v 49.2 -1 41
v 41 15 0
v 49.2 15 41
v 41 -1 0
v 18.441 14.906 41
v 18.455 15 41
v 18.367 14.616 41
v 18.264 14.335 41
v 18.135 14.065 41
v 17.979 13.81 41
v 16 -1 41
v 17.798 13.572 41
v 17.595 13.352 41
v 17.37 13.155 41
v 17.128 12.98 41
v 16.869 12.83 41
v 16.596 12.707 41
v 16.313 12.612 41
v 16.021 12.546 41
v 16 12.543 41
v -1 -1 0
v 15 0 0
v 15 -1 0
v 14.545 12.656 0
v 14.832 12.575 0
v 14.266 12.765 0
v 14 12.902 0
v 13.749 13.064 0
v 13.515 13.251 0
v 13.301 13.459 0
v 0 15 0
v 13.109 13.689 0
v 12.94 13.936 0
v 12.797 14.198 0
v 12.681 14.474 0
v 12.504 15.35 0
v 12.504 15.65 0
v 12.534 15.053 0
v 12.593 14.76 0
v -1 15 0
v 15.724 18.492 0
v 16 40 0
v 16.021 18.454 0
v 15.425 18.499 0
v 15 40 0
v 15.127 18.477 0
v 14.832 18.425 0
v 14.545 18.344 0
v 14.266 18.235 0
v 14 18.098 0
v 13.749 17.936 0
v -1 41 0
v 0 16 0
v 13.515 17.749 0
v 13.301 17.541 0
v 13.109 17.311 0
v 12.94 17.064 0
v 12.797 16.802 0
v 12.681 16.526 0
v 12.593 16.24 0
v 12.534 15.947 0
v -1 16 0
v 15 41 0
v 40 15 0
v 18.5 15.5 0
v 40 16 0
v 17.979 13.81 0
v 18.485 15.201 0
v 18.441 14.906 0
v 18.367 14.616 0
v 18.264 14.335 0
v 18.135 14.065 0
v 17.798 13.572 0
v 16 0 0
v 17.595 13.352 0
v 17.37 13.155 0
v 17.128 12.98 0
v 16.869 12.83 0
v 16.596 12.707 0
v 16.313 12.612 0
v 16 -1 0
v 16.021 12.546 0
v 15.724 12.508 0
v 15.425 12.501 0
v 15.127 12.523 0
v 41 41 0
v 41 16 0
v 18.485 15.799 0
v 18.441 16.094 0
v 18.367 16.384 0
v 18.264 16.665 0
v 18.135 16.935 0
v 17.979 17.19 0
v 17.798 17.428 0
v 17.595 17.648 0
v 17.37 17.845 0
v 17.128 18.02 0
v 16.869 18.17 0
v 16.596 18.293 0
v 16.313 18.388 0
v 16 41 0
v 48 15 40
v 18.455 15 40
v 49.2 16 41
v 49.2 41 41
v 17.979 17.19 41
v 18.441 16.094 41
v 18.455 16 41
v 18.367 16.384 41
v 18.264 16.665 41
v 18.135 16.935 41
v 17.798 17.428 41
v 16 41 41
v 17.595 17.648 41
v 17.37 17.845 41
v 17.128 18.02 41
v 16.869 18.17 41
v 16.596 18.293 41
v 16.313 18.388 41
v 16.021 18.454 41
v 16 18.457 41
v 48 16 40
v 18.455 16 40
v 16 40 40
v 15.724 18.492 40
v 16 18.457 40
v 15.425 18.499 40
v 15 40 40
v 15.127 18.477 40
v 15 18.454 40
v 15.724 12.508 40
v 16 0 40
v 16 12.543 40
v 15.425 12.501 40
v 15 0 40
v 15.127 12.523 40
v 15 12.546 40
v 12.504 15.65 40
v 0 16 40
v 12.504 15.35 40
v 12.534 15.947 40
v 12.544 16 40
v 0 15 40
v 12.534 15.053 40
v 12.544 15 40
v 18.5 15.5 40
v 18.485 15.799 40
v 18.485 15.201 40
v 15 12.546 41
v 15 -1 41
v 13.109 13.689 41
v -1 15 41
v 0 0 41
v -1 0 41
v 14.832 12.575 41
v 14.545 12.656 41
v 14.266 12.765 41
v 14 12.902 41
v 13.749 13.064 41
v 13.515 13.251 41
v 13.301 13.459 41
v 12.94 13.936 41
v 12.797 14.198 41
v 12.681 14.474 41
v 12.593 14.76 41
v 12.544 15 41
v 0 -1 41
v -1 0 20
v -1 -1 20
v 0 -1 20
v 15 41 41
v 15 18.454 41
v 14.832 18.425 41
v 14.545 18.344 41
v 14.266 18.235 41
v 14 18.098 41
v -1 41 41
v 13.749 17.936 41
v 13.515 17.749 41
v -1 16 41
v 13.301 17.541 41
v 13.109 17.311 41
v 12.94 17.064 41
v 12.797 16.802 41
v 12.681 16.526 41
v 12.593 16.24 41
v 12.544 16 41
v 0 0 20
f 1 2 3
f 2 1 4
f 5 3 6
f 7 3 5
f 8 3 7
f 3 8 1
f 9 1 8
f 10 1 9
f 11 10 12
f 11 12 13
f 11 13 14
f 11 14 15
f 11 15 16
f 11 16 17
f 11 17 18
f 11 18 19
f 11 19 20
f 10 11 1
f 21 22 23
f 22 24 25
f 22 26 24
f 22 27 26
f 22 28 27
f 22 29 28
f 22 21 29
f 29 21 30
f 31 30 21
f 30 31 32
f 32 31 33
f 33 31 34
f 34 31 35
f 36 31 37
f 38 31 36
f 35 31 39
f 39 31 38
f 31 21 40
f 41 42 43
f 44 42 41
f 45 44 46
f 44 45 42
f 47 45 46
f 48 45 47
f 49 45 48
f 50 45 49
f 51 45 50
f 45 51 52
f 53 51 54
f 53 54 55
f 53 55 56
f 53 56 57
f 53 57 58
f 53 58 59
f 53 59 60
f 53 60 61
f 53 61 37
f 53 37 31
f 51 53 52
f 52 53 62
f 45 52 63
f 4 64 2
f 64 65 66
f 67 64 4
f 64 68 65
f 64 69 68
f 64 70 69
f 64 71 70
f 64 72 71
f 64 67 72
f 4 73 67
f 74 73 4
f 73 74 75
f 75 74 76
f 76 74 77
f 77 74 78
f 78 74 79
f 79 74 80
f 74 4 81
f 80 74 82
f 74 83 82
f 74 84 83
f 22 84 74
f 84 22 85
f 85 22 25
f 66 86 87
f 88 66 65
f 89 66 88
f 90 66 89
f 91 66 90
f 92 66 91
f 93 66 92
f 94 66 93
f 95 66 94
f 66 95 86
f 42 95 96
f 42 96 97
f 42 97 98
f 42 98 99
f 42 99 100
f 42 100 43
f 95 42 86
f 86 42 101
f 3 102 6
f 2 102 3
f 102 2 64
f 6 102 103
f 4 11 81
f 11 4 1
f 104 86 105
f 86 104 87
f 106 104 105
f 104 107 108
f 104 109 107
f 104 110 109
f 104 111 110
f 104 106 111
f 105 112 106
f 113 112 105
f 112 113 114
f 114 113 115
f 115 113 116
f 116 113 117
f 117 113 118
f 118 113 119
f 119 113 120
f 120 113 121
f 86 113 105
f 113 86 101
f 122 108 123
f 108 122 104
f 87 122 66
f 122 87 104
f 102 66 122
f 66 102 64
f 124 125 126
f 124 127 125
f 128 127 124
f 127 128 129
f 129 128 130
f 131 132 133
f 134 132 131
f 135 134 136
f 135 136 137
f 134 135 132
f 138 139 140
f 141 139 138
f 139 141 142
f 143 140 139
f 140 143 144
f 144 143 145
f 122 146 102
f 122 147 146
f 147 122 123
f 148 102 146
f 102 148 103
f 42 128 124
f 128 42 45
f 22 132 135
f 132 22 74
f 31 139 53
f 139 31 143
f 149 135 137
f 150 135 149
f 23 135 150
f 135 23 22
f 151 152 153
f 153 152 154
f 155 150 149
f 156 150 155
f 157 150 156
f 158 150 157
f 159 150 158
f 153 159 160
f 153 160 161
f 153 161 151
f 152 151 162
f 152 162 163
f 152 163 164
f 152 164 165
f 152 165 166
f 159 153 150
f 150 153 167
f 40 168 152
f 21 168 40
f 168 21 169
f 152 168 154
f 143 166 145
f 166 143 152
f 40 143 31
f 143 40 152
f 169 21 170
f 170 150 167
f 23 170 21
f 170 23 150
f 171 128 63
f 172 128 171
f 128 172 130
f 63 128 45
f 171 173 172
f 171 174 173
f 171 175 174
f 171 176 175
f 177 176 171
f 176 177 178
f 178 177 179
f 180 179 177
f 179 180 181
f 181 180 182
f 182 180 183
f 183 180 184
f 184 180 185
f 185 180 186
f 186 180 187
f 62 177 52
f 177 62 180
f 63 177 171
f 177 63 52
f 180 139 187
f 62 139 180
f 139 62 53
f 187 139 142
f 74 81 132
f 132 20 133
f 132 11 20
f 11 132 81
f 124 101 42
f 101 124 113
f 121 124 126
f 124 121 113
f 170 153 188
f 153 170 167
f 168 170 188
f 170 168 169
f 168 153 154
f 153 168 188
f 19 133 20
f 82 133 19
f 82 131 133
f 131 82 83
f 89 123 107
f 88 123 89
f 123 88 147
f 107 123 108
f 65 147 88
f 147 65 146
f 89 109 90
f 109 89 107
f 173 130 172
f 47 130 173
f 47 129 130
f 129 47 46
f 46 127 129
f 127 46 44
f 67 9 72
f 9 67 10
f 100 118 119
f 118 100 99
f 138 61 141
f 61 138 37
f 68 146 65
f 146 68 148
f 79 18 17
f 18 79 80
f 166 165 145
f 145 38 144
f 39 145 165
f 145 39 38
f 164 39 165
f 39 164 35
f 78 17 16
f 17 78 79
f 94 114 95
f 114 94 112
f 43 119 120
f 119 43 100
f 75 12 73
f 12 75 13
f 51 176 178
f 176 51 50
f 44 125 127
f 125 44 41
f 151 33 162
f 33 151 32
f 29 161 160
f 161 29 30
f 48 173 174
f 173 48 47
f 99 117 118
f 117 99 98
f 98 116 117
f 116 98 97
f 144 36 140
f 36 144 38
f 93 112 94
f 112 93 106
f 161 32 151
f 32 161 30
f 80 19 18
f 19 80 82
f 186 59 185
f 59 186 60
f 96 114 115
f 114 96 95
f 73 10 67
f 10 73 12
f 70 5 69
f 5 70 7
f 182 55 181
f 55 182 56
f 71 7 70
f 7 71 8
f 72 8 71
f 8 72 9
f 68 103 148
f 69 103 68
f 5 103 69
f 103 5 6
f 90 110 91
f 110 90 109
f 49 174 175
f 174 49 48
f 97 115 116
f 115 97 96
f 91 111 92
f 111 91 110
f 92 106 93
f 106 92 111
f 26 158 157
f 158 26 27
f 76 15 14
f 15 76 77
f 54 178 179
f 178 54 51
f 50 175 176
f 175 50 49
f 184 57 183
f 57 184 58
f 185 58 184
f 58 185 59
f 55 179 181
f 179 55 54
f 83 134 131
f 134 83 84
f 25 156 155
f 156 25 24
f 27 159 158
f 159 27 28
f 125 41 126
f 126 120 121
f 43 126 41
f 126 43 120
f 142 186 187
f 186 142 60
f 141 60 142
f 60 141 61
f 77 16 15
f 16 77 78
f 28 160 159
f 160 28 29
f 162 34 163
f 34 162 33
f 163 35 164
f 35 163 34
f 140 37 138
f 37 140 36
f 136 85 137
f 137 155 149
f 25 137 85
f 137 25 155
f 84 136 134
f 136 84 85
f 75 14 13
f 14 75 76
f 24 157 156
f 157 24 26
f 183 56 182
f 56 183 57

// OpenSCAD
$fs = 0.3;
$fa = 1;

difference() {
	union() {
		multmatrix([[1, 0, 0.2], [0, 1, 0], [0, 0, 1]]) {
			cube(40);
		}
		cube(40);
		translate([-1, -1, 0]) {
			cube([16, 16, 41]);
		}
		translate([-1, 16, 0]) {
			cube([16, 25, 41]);
		}
		translate([16, -1, 0]) {
			cube([24, 16, 41]);
		}
		translate([16, 16, 0]) {
			cube([24, 25, 41]);
		}
		multmatrix([[1, 0, 0.2], [0, 1, 0], [0, 0, 1]]) {
			translate([16, -1, 0]) {
				cube([25, 16, 41]);
			}
			translate([16, 16, 0]) {
				cube([25, 25, 41]);
			}
		}
	}
	translate([-2, -2, 20]) {
		cube([2, 2, 22]);
	}
	translate([15.5, 15.5, 0]) {
		cylinder(r=3, h=42);
	}
}
